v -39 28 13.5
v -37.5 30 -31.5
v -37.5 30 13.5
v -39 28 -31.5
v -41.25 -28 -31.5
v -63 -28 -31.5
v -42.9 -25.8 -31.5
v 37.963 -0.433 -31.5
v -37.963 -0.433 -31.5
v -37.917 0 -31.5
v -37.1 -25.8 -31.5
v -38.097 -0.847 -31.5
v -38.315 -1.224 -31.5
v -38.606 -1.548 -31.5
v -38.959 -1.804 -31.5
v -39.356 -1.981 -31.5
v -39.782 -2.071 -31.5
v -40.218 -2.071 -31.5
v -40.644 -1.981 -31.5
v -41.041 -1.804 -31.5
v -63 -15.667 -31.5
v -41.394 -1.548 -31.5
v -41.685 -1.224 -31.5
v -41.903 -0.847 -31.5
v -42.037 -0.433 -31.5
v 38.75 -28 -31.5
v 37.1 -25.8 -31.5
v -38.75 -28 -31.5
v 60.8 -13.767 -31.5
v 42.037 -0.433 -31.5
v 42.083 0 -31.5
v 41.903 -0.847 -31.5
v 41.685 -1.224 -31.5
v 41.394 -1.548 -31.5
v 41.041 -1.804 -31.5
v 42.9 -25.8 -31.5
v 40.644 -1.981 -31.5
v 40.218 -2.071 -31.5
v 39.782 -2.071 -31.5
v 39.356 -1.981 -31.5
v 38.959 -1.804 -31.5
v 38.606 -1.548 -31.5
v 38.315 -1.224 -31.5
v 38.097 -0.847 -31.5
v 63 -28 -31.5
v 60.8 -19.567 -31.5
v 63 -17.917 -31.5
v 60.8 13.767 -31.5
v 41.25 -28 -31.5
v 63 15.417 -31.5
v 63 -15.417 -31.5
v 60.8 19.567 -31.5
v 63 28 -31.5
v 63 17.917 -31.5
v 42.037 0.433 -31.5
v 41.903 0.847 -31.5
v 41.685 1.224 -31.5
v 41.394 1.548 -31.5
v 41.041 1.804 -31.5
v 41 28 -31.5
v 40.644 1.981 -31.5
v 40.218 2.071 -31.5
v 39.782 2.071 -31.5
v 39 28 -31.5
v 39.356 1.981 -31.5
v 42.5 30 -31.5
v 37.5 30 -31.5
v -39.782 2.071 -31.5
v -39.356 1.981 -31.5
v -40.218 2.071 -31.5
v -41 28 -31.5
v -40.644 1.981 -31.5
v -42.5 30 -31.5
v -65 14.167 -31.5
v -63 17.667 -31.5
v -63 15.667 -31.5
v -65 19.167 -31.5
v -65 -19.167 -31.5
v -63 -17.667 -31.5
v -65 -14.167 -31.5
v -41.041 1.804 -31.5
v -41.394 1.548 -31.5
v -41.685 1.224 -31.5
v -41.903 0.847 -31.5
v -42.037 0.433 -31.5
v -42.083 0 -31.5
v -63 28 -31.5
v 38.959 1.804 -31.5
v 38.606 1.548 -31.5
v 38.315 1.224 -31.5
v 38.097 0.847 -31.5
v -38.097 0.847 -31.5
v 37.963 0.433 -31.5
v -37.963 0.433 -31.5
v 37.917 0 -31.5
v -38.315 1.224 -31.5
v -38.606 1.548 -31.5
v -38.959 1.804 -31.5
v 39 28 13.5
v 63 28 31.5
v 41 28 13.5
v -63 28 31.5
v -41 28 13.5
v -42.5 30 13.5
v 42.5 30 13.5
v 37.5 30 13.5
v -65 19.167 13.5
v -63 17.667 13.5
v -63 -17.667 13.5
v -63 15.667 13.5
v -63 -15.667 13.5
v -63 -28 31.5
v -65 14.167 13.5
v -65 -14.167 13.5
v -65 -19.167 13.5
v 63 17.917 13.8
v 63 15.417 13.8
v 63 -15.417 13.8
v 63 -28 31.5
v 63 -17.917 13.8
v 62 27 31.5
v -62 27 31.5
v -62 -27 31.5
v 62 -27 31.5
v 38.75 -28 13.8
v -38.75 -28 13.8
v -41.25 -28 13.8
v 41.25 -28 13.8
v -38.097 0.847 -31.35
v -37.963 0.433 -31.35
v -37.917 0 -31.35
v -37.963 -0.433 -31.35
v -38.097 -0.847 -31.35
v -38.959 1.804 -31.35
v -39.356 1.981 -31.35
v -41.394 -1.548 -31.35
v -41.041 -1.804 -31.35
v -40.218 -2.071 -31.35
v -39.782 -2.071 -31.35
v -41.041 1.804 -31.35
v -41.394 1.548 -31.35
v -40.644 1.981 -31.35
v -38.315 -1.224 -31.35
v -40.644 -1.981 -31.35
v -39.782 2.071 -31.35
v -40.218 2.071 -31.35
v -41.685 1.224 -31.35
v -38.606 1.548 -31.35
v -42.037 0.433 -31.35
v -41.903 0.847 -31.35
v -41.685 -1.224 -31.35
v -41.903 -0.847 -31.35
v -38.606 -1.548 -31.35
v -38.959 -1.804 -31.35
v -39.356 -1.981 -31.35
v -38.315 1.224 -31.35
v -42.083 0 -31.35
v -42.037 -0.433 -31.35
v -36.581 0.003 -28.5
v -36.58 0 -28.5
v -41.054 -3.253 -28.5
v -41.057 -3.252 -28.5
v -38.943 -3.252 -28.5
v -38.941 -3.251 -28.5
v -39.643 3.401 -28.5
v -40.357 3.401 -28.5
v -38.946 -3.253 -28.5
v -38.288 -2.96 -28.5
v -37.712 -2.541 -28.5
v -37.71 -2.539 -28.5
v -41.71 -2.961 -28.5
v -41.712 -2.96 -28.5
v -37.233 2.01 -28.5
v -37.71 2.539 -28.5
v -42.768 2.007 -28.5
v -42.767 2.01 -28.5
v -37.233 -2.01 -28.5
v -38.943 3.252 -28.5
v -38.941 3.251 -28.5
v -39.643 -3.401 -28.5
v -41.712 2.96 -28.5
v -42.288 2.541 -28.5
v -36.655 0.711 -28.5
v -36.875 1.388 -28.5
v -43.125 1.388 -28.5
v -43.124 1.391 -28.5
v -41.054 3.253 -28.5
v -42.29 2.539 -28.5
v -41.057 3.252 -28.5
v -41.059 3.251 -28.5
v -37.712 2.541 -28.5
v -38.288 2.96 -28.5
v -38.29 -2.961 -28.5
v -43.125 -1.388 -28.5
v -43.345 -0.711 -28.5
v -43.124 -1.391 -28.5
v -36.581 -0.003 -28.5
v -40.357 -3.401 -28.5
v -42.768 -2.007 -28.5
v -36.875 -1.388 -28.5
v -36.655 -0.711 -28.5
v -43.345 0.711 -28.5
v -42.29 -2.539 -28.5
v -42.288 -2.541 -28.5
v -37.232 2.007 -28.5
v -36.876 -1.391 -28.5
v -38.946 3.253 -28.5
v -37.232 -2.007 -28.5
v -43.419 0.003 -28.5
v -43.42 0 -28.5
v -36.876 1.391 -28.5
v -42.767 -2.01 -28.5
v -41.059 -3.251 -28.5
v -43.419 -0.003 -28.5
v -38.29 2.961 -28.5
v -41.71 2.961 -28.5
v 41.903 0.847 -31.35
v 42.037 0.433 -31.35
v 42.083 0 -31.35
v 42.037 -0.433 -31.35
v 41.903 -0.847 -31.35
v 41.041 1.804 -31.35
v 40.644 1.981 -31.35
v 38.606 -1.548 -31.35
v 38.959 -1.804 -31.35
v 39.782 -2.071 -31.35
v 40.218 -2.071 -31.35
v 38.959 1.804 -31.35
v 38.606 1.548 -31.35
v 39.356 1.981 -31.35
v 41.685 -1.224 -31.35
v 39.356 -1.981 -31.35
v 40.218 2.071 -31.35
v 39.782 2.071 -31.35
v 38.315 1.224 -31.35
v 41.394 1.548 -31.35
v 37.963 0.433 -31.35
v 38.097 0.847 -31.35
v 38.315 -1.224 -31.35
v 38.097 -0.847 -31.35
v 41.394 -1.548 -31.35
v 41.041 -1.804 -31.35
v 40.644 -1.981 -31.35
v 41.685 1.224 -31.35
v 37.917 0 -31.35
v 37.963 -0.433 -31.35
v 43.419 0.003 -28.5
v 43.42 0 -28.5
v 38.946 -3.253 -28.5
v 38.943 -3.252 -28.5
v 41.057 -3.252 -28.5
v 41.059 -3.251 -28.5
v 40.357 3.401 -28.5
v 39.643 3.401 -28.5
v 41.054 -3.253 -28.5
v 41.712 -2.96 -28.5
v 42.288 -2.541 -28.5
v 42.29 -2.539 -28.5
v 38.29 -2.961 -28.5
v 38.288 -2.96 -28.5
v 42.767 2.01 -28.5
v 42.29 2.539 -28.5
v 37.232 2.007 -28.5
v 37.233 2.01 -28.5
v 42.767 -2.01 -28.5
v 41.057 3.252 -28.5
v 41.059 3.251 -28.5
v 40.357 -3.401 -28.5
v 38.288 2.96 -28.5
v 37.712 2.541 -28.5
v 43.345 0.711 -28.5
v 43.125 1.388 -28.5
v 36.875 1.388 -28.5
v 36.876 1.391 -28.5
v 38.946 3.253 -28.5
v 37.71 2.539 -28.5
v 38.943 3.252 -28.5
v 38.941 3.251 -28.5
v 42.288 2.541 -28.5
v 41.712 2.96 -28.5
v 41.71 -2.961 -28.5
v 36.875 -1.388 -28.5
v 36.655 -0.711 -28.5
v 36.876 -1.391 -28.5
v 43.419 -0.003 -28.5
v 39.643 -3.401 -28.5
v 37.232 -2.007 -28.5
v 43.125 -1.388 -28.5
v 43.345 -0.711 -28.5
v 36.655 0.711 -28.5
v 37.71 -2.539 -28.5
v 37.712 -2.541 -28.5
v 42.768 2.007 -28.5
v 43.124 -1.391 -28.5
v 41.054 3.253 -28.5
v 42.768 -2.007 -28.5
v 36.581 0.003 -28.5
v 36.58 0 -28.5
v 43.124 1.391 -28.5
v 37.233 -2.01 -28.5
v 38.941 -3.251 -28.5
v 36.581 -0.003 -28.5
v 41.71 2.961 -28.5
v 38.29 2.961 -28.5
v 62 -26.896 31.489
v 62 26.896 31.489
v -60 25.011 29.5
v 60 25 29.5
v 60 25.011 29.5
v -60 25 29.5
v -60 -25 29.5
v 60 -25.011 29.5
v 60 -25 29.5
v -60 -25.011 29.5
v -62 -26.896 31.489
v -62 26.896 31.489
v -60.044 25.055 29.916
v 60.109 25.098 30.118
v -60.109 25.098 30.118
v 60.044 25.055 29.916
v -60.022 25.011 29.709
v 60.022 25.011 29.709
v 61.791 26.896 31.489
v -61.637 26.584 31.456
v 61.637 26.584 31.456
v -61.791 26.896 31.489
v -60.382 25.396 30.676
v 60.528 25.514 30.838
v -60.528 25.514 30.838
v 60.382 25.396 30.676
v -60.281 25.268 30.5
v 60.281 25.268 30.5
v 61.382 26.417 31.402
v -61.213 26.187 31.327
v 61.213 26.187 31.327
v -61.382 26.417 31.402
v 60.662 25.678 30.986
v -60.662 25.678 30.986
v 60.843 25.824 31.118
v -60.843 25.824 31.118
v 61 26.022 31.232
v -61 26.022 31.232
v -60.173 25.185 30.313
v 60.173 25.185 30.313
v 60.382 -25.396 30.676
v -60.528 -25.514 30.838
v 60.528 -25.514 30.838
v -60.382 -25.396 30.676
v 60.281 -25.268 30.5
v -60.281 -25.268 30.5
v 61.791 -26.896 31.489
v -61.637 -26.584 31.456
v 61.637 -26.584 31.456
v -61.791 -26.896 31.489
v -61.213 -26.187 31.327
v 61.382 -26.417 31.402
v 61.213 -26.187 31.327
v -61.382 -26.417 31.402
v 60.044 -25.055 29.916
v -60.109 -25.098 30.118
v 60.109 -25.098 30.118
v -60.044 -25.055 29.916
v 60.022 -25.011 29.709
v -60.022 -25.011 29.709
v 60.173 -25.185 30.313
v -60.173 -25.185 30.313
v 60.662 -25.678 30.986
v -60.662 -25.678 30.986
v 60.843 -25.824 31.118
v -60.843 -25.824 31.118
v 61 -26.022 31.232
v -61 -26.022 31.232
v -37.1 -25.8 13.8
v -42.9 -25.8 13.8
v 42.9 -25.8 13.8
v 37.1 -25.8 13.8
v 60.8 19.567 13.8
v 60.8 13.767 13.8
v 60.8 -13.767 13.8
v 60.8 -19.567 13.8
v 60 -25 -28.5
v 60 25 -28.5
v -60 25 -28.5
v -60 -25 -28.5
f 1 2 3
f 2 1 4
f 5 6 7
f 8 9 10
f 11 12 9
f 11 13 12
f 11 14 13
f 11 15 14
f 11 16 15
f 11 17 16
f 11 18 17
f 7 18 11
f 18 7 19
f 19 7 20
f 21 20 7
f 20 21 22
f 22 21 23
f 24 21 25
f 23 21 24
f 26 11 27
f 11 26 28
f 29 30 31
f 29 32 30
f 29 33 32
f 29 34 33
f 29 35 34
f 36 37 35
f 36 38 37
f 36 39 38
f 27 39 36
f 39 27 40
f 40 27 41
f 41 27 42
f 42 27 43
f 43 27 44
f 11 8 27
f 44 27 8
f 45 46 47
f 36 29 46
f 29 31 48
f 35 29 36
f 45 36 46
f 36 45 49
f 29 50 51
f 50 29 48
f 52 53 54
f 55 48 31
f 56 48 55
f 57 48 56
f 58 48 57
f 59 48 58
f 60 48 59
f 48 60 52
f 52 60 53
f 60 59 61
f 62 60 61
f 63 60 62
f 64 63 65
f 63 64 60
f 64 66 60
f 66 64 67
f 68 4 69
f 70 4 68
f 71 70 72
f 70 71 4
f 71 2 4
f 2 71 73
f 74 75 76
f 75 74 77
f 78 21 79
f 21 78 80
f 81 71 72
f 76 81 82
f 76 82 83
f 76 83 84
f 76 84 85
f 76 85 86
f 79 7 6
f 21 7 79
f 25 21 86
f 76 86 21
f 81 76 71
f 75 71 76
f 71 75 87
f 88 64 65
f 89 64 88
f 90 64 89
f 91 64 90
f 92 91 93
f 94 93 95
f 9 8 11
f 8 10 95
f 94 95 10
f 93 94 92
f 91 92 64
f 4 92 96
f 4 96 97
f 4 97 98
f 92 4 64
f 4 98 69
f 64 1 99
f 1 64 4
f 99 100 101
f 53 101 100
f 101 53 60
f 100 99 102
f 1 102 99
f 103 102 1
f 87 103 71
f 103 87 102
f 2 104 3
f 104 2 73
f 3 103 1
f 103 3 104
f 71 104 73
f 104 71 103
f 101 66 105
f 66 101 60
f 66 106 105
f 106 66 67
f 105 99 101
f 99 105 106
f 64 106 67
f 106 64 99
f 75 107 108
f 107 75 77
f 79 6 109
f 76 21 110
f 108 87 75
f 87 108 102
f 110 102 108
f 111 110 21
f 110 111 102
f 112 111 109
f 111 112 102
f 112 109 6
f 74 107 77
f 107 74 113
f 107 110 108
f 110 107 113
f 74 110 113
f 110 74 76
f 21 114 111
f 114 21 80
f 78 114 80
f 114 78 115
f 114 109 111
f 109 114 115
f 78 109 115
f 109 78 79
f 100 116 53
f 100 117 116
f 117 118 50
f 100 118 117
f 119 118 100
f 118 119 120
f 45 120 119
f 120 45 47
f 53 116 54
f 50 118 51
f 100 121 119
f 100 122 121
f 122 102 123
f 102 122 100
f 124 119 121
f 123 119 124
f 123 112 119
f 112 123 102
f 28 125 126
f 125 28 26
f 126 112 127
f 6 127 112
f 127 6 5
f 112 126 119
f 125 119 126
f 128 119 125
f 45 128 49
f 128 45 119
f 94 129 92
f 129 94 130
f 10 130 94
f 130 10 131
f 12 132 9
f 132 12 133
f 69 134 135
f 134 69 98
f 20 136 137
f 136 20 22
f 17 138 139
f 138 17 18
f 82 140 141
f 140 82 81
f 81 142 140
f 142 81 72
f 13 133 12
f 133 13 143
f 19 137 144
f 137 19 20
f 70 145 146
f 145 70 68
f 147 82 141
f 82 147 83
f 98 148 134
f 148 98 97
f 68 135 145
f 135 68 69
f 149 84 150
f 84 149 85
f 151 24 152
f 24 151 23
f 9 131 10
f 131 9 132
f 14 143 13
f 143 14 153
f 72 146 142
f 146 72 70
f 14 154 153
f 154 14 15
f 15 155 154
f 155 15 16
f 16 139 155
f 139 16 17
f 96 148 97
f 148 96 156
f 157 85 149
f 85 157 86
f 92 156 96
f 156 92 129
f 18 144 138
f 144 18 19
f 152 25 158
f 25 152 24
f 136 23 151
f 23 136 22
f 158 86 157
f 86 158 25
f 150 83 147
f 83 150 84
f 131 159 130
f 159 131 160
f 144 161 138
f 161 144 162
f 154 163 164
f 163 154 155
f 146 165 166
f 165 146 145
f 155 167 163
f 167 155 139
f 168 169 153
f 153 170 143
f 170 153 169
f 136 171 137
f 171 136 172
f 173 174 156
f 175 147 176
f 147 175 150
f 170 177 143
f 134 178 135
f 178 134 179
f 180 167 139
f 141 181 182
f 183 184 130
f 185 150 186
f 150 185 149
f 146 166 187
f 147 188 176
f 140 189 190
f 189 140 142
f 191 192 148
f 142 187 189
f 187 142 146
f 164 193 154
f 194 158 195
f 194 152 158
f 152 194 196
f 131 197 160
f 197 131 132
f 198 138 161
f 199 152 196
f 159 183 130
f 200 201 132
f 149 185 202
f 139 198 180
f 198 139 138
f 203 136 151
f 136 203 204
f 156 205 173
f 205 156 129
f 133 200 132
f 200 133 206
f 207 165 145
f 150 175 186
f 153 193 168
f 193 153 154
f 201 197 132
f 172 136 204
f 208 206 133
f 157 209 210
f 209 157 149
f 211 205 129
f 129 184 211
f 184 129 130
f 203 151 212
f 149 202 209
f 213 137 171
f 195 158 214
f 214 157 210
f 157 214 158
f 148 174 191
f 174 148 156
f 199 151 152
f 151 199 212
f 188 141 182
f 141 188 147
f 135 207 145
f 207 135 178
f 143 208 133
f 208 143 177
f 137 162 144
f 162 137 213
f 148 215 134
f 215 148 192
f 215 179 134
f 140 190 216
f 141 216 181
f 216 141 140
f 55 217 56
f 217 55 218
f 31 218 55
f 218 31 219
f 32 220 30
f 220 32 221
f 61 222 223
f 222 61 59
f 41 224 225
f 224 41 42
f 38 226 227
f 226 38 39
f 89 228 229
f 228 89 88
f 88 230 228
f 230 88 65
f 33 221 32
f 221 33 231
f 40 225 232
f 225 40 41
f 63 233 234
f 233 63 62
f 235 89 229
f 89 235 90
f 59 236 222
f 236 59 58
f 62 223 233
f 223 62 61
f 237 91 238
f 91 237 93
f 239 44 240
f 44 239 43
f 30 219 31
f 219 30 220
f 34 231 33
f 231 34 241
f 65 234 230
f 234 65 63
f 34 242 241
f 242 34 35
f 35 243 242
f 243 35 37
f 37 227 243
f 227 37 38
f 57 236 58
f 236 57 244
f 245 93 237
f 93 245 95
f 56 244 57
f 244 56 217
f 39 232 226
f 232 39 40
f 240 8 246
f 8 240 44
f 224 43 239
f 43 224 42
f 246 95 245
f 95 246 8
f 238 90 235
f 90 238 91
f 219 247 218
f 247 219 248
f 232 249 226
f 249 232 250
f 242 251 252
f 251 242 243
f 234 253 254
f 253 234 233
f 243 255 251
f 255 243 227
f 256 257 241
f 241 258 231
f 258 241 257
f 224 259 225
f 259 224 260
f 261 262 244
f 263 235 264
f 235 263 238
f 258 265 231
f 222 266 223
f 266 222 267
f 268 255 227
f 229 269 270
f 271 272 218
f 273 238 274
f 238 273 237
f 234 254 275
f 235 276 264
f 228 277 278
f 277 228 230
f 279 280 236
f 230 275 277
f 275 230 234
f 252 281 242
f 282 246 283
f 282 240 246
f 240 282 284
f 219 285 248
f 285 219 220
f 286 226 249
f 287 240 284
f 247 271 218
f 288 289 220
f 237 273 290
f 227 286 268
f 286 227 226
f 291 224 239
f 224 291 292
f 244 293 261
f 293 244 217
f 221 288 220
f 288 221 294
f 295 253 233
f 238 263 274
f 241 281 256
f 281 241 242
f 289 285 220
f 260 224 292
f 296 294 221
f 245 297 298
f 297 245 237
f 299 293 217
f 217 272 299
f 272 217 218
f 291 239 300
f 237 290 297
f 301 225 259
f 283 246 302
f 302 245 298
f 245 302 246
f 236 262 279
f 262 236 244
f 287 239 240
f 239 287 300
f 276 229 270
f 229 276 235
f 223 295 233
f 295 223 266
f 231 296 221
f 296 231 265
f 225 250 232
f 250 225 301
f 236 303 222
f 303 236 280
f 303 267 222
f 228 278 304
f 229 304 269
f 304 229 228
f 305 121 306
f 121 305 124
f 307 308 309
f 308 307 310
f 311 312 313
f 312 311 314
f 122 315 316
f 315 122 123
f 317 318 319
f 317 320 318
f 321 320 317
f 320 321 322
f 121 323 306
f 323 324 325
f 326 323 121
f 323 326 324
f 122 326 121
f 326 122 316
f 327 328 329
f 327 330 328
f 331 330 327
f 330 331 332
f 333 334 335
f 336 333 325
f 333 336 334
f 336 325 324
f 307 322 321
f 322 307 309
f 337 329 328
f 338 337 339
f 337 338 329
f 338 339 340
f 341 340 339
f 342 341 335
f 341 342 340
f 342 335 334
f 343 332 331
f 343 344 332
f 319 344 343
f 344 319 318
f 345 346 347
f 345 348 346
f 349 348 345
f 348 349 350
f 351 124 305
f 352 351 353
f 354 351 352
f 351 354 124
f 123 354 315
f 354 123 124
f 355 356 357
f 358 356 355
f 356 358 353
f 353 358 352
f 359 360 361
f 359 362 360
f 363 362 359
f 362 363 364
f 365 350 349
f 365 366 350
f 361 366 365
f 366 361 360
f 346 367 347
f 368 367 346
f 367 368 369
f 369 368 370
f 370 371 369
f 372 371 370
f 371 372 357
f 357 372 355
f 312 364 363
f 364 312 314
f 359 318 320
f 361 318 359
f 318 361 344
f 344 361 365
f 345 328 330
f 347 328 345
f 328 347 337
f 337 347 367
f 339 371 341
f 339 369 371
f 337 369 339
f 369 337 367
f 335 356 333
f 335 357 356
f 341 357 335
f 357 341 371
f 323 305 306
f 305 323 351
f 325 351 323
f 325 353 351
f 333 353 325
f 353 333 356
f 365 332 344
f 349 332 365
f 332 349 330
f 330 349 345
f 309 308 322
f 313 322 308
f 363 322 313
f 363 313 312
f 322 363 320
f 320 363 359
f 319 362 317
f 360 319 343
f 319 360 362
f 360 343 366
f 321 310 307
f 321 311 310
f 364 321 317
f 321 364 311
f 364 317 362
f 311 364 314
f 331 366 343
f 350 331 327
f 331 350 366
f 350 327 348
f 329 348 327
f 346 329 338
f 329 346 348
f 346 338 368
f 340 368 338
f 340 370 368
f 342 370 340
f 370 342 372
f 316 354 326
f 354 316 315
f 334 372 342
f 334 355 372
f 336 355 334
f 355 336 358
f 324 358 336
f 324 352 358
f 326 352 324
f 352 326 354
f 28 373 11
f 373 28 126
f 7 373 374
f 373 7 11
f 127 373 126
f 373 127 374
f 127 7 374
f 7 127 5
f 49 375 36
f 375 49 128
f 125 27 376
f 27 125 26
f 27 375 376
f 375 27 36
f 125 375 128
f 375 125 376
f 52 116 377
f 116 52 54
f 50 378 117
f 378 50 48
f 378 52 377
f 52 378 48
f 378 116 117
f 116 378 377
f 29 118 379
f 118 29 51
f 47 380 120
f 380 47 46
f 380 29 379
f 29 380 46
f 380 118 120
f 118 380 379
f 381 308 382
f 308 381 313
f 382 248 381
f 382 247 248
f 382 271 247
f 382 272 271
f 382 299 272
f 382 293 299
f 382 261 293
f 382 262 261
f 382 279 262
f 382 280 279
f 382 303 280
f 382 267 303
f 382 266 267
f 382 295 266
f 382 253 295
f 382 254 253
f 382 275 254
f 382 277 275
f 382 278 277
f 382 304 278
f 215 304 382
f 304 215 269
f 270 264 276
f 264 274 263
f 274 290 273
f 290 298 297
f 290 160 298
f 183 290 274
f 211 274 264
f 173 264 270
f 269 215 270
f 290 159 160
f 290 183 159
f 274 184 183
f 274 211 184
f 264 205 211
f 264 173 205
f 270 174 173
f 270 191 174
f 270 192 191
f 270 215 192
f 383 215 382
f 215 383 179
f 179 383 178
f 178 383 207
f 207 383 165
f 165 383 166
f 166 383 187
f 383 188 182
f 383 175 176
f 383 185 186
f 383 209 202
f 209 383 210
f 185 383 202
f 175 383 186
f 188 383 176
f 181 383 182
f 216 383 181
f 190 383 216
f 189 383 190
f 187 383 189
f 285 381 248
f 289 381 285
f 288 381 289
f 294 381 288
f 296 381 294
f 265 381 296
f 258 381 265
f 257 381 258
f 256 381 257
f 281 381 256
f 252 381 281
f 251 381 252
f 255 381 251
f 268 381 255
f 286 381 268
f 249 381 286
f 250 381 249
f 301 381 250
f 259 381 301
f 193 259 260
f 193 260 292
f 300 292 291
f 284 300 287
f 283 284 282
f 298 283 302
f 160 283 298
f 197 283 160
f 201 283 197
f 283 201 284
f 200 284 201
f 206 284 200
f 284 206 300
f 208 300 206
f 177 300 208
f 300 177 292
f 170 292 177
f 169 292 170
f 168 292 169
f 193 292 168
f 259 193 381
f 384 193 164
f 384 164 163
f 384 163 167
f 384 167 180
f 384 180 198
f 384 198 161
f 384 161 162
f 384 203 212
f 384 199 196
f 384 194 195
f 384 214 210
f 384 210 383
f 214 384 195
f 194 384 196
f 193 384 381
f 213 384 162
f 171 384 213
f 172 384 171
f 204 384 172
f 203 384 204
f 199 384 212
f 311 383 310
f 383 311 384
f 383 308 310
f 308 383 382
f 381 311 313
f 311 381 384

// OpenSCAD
/* 
*  Copyright (c)..: 2018 janpetersen.com
*
*  Creation Date..:11/18/2018
*  Discription....: Box Wizard - OpenScad application to build fully parametric boxes
*
*  Rev 1: Developed Model
*
*  This program is free software; you can redistribute it and/or modify
*  it under the terms of the GNU General Public License as published by
*  the Free Software Foundation; either version 2 of the License, or
*  (at your option) any later version.
*
*  This program is distributed in the hope that it will be useful,
*  but WITHOUT ANY WARRANTY; without even the implied warranty of
*  MERCHANTABILITY or FITNESS FOR A PARTICULAR PURPOSE.  See the
*  GNU General Public License for more details.
*
*  If used commercially attribution is required (janpetersen.com)
*
*
*   Thingiverse Customizer documentation:
*   http://customizer.makerbot.com/docs
*
*
*/

/* ----- customizer view ----- */
//preview[view:north, tilt:top]

/* ----- parameters ----- */

/* [Hidden] */
$fn=30; // recomended value for smooth circle is 60
debug = false;

// Standard screw dimensions arrays
//    [ screwDiameter (d), headDiameter (d1), headHeight (k) ]

CounterSunkScrewsMetric=[ 
// DIN963 slotted countersunk (flathead) head
        [0, 0, 0],            // "none"
        [1, 1.9, 0.6],      // "M1"
        [1.6, 3, 0.96],    // "M1.6"
        [2, 3.8, 1.2],      // "M2"
        [2.5, 4.7, 1.5],   // "M2.5"
        [3, 5.6, 1.65],    // "M3"
        [3.5, 6.5, 1.93], //"M3.5"
        [4, 7.5, 2.2],      // "M4"
        [5, 9.2, 2.5],      // "M5"
        [6, 11, 3],          // "M6"
        [8, 14.5, 4],       // "M8"
        [10, 18, 5],        // "M10"
        [12, 22, 6],        // "M12"
        [16, 29, 8]         // "M16"
  ];
  CounterSunkScrewsStandard=[
        [0, 0, 0],                        // "none"
        [0.021, 0.038, 0.019],   // "0000"
        [0.034, 0.059, 0.029],   // "000"
        [0.047, 0.082, 0.037],   // "00"
        [0.06, 0.096, 0.043],     // "0"
        [0.073, 0.118, 0.053],   // "1"
        [0.086, 0.140, 0.062],   // "2"
        [0.099, 0.161, 0.070],   // "3"
        [0.112, 0.183, 0.079],   //"4"
        [0.125, 0.205, 0.088],   // "5"
        [0.138, 0.226, 0.096],   // "6"
        [0.164, 0.270, 0.113],   // "8"
        [0.190, 0.313, 0.130],   // "10"
        [0.216, 0.357, 0.148],   // "12"
        [0.250, 0.414, 0.170],   // "1/4"
        [0.3125, 0.518, 0.211], // "5/16"
        [0.375, 0.622, 0.253],   // "3/8"
        [0.4375, 0.625, 0.265], // "7/16"
        [0.500, 0.750, 0.297],   // "1/2"
        [0.5625, 0.812, 0.336], // "9/16"
        [0.625, 0.875, 0.375],   // "5/8"
        [0.750, 1.000, 0.441]    // "3/4"
    ];

/* [Global] */

/* [Box] */
// internal width of box
width=50;   
// internal length of box
length=120; 
// internal height of box
height=60;  
// wall thickness in mm
wallThickness=3; 

/* [Fillets] */
// radius of inside fillet on box opening, set to 0 for no fillet
insideFillet=2; 


/* [Mounting Screws] */
Metric_Counter_Sunk=0; // [0:none, 1:M1, 2:M1.6, 3:M2, 4:M2.5, 5:M3, 6:M3.5, 7:M4, 8:M5, 9:M6, 10:M8, 11:M10, 12:M12, 13:M16]
Standard_Counter_Sunk=11; // [0:none, 1:0000, 2:000, 3:00, 4:0, 5:1, 6:2, 7:3, 8:4, 9:5, 10:6, 11:8, 12:10, 13:12, 14:1/4, 15:5/16, 16:3.8, 17:7/16, 18:1/2, 19:9/16, 20:5/8, 21:3/4]

/* [Stacking Slots] */
Add_Stacking_Slots="both"; // [none, side, end, both]
Slot_Width=5; 
Slot_Height=2; 
Slot_Chamfer=3; 
Slot_Length=45; 
// tolerance to allow for tight fit when mating the boxes
Slot_Clearance=0.2; 


/* ----- execute ----- */

mainModule();


/* ----- functions ----- */    
function inch_to_mm(inch) = inch / 0.039370;


/* ----- modules ----- */
module mainModule() {

    // if a mounting screw is selected, set the screw variables
    d = Metric_Counter_Sunk > 0 ? CounterSunkScrewsMetric[Metric_Counter_Sunk][0] : inch_to_mm( CounterSunkScrewsStandard[Standard_Counter_Sunk][0]);
    d1 = Metric_Counter_Sunk > 0 ? CounterSunkScrewsMetric[Metric_Counter_Sunk][1] : inch_to_mm( CounterSunkScrewsStandard[Standard_Counter_Sunk][1]);
    k = Metric_Counter_Sunk > 0 ? CounterSunkScrewsMetric[Metric_Counter_Sunk][2] : inch_to_mm( CounterSunkScrewsStandard[Standard_Counter_Sunk][2]);
    l = wallThickness;
    if ( debug ) {
        echo("Screw Diameter: " , d);
        echo("Screw Head Diameter: ", d1);
        echo("Screw Head Hight: ", k);
        echo("Screw Length: ", l);        
    }

    difference() {
        union() {
            cube( size=[
                    ( length+2*wallThickness ),
                    ( width+2*wallThickness ),
                    ( height+wallThickness ) 
                 ], center=true );
            if ( ( Add_Stacking_Slots == "both" || Add_Stacking_Slots == "side" ) && ( Slot_Width * 4 < length )) {
                translate( [ -length / 3, width / 2 + wallThickness, - ( height + wallThickness ) / 2 ] )
                    slot();
                translate( [ length / 3, width / 2 + wallThickness, - ( height + wallThickness ) / 2 ] )
                    slot();
            }
            if ( ( Add_Stacking_Slots == "both" || Add_Stacking_Slots == "end" ) && ( Slot_Width * 4 < width ) ) {
                translate( [ -length / 2 - wallThickness, width / 3, - ( height + wallThickness ) / 2 ] )
                    rotate( [ 0, 0, 90 ] )
                        slot();
                translate( [ -length / 2 - wallThickness, -width / 3, - ( height + wallThickness ) / 2 ] )
                    rotate( [ 0, 0, 90 ] )
                        slot();
            }
        }
        translate([0, 0, wallThickness/2 + 0.01 ])
            cube( size=[ length, width, height + 0.02 ], center=true );
        if ( d > 0 ) {
            translate( [ -length/3, 0, - height  / 2  + 0.01 ] )
                screwHole(d, d1, k, l + 0.02);
            translate( [ length/3, 0, - height  / 2  + 0.01 ] )
                screwHole(d, d1, k, l + 0.02);
        }
        if ( insideFillet > 0 )
            translate( [ 0, 0, (height  + wallThickness - insideFillet ) / 2] )
                insideFillet();

        if ( ( Add_Stacking_Slots == "both" || Add_Stacking_Slots == "side" ) && ( Slot_Width * 4 < length ) ) {
            translate( [ -length / 3, - width / 2 - wallThickness, - (height + wallThickness + Slot_Clearance ) / 2 ] )
                groove();
            translate( [ length / 3, - width / 2 - wallThickness, - (height + wallThickness + Slot_Clearance ) / 2 ] )
                groove();
        }
        if ( ( Add_Stacking_Slots == "both" || Add_Stacking_Slots == "end" ) && ( Slot_Width * 4 < width ) ) {
            translate( [ length / 2 + wallThickness, width / 3, - ( height + wallThickness + Slot_Clearance ) / 2 ] )
                rotate( [ 0, 0, 90 ] )
                    groove();
            translate( [ length / 2 + wallThickness, -width / 3, - ( height + wallThickness + Slot_Clearance ) / 2 ] )
                rotate( [ 0, 0, 90 ] )
                    groove();
        }

    }
}

module screwHole(d, d1, k, l) {
    // d = screw diameter
    // d1 = head diameter
    // k = head height
    // l = screw length

    chamferHeight = min( k, l );
    if ( debug ) {
        echo("Adjusted screw chamfer height: ", chamferHeight);
    }
    union() {
        cylinder( d=d, h=l + 0.02, center=true );
        if ( d1> d ) {
            translate( [ 0, 0, ( l - chamferHeight ) / 2 ] )
                cylinder( d1=d, d2=d1, h= chamferHeight, center=true );
        }
    }
}

module insideFillet() {
    difference() {
        cube(size=[ length + insideFillet * 2, width + insideFillet * 2, insideFillet ], center=true);
        translate( [ 0, width / 2 + insideFillet , -insideFillet / 2] )
            rotate( [ 0, 90, 0 ] )
                cylinder( r=insideFillet, h=length + insideFillet * 2 + 0.01, center=true );
        translate( [ 0, - width / 2 - insideFillet , -insideFillet / 2 ] )
            rotate( [ 0, 90, 0 ] )
                cylinder( r=insideFillet, h=length + insideFillet * 2 + 0.01, center=true );
        translate( [  length / 2 + insideFillet , 0, -insideFillet / 2 ] )
            rotate( [ 90, 0, 0 ] )
                cylinder( r=insideFillet, h=width + insideFillet * 2 + 0.01, center=true );
        translate( [  -length / 2 - insideFillet , 0, -insideFillet / 2 ] )
            rotate( [ 90, 0, 0 ] )
                cylinder( r=insideFillet, h=width + insideFillet * 2 + 0.01, center=true );
    }
}

module slot() {
    h = min( wallThickness - 1, Slot_Height );
    d1 = max( 1, Slot_Width - Slot_Chamfer );
    p = [
        [ Slot_Width / 2, h ],
        [ -Slot_Width / 2, h ],
        [ -d1 / 2, 0 ],
        [ d1 / 2, 0 ]
    ];
    if ( debug ) {
        echo( p );
    }
    linear_extrude( height=Slot_Length )
        polygon( points=p );
}

module groove() {
    h = min( wallThickness - 1, Slot_Height );
    d1 = max( 1, Slot_Width - Slot_Chamfer );
    p = [
        [ Slot_Width / 2, h ],
        [ -Slot_Width / 2, h ],
        [ -d1 / 2, 0 ],
        [ d1 / 2, 0 ]
    ];
    if ( debug ) {
        echo( p );
    }
    linear_extrude( height=Slot_Length + Slot_Clearance * 2)
        offset(delta=Slot_Clearance) polygon( points=p );
}
